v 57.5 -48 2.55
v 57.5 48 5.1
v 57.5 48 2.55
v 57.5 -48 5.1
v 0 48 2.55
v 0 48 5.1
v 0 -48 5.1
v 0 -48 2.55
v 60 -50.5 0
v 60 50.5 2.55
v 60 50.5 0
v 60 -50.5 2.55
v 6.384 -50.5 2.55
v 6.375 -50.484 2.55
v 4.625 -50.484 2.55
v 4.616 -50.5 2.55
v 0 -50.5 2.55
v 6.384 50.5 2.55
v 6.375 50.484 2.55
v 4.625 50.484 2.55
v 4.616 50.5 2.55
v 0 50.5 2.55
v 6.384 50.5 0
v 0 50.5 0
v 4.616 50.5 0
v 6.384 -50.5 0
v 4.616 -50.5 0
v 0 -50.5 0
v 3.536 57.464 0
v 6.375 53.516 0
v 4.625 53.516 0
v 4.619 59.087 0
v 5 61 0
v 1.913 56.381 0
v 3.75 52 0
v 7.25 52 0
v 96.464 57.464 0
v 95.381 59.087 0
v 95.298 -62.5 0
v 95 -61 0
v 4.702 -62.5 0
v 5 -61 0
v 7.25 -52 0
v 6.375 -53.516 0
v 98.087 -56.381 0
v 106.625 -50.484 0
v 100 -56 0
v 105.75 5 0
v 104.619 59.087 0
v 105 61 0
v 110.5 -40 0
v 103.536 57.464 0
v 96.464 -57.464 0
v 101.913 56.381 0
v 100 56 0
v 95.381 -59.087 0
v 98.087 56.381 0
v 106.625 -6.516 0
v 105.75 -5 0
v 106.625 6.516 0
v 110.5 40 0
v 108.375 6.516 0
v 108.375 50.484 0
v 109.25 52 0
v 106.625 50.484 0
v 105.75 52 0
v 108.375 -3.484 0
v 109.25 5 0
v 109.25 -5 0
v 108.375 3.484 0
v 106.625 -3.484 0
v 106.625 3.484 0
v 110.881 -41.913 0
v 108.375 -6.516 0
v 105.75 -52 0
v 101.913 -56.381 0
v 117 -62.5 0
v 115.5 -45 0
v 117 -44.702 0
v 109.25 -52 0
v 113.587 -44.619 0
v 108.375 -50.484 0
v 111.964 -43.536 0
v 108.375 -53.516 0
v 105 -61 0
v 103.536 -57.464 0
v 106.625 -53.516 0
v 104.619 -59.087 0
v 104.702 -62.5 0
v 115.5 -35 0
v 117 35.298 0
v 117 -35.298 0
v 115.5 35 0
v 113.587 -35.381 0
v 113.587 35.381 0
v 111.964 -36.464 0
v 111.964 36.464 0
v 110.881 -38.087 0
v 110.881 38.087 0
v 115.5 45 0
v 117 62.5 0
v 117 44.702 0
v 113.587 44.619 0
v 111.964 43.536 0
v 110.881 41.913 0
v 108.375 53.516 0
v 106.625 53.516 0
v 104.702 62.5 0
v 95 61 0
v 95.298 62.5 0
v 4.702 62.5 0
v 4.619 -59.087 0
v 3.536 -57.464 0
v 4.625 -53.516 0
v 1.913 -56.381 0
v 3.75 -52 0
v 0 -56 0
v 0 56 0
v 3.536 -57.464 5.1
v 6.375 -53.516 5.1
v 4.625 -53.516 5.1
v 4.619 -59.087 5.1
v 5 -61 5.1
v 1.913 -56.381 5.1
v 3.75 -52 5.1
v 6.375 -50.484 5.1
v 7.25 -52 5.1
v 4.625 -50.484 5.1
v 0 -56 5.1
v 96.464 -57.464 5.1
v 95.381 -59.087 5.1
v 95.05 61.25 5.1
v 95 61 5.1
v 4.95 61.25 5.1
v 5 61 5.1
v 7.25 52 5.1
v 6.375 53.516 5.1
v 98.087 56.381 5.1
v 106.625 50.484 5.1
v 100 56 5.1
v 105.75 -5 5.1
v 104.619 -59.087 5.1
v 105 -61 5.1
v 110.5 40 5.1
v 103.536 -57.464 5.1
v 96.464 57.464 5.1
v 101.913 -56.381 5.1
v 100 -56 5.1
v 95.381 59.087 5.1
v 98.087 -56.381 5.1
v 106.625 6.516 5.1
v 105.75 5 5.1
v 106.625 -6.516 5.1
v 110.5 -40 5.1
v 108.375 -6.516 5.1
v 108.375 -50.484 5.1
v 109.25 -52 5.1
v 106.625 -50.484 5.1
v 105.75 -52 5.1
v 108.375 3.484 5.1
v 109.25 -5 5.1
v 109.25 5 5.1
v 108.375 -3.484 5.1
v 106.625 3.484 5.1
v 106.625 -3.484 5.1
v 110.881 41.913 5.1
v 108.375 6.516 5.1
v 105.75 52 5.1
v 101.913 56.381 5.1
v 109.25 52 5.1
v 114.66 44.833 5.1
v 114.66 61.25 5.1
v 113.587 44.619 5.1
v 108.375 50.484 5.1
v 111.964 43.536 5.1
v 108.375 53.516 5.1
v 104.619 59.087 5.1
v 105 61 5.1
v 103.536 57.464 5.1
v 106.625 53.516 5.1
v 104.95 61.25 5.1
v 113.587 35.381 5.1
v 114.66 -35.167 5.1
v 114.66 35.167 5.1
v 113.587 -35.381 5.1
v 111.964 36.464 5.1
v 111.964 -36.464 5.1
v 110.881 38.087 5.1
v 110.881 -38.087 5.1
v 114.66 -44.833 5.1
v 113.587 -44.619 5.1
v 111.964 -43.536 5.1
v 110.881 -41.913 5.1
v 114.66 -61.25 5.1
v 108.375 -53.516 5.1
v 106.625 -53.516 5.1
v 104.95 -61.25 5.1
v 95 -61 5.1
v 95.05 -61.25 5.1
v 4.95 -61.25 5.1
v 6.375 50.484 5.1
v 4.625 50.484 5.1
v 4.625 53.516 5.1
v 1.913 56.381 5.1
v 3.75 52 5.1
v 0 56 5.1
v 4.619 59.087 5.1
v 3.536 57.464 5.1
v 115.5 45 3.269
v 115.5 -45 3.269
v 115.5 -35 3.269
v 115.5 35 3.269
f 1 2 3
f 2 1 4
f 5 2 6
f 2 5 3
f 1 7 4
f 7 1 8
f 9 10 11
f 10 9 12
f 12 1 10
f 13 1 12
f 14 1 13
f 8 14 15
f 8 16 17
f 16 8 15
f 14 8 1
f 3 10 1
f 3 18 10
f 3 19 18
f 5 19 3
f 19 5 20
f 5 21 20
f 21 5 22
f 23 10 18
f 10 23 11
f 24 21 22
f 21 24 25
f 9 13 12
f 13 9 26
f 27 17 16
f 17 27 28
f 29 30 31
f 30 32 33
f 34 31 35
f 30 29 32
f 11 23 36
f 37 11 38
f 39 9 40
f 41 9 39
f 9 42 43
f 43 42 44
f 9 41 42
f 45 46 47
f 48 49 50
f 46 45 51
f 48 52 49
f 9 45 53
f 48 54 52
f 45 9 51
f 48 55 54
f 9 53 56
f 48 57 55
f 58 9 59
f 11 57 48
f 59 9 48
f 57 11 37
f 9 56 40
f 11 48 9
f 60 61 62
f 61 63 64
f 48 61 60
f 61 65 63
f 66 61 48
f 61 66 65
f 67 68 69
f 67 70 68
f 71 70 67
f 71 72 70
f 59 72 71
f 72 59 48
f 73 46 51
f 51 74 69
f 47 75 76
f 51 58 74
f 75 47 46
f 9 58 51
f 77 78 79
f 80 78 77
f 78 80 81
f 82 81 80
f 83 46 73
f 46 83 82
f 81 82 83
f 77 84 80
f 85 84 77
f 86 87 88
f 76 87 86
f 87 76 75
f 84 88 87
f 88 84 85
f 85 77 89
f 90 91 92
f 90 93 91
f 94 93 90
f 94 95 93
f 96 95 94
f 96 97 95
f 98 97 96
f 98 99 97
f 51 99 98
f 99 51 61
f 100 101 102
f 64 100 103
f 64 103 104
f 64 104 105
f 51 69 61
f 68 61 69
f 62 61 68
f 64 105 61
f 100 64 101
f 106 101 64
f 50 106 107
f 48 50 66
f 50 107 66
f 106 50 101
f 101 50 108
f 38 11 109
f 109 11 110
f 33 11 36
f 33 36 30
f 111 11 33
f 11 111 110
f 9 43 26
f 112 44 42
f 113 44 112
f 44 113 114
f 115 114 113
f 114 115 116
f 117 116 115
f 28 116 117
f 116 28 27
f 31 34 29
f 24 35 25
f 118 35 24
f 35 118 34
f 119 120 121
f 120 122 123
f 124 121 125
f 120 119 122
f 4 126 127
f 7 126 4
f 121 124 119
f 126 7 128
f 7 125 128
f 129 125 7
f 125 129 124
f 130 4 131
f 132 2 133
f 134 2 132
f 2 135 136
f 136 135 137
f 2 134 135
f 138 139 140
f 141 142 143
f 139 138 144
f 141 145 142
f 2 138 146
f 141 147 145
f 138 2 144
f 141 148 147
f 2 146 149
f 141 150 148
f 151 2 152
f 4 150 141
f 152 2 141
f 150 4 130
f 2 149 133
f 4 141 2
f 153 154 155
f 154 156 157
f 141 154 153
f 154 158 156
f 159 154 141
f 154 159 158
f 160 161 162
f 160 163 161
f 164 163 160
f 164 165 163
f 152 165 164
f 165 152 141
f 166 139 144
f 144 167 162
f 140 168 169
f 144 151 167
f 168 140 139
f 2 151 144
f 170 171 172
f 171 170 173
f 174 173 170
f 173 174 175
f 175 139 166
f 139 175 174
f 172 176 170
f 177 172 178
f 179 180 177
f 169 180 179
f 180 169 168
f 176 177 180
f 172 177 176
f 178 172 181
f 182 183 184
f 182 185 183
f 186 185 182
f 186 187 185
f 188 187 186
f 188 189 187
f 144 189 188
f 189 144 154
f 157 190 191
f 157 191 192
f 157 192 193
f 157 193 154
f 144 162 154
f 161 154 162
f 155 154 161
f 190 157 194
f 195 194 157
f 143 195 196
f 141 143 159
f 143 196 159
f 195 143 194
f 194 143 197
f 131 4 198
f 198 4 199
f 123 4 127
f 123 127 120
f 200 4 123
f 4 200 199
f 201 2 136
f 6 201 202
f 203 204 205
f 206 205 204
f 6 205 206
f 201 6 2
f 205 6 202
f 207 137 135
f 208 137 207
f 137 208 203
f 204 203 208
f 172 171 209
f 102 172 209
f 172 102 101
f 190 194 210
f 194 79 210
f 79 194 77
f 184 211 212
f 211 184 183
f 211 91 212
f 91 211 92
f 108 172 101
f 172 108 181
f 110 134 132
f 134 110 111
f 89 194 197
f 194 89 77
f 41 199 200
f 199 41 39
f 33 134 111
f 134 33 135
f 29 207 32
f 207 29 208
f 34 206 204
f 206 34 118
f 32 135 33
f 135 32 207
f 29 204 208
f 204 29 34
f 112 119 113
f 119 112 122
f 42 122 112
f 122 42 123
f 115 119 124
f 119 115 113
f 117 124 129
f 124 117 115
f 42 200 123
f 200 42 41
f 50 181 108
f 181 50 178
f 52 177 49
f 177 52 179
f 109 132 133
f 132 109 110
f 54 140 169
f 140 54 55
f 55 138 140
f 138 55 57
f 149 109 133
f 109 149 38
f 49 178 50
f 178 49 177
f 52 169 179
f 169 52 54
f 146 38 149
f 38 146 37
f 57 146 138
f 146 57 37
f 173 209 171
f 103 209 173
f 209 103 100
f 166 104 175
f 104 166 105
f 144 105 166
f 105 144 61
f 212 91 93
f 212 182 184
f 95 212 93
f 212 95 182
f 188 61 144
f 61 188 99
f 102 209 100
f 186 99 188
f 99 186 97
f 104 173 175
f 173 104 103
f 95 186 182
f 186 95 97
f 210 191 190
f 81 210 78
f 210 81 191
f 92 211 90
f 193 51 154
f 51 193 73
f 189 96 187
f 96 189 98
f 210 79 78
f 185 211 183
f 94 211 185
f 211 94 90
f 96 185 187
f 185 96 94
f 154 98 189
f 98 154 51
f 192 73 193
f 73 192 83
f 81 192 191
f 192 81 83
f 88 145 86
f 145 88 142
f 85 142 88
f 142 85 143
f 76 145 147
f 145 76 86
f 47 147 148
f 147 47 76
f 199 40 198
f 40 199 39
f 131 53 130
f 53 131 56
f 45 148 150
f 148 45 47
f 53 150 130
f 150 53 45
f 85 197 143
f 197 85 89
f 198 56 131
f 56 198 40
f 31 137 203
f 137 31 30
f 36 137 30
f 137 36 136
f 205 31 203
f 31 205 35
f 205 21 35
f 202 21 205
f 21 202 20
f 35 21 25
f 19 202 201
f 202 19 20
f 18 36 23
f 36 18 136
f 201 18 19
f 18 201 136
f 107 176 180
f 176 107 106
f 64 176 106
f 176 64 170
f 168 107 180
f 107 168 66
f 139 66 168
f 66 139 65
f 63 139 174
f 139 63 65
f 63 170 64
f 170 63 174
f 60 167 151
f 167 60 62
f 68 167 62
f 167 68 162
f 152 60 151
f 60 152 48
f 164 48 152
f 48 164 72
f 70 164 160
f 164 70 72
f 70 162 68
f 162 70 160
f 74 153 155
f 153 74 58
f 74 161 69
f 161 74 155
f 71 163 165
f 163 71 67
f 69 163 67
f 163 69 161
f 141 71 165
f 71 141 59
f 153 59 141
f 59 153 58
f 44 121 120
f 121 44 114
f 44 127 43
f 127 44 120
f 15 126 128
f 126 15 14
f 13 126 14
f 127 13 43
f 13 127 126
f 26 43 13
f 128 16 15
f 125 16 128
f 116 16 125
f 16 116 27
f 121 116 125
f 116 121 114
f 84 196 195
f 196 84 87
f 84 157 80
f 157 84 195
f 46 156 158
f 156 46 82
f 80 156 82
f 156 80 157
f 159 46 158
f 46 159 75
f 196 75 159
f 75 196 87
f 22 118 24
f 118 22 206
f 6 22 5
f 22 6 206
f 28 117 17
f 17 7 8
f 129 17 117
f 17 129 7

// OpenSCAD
DISPLAY_height = 101; 
DISPLAY_width = 166; 
DISPLAY_depth = 5.1; 
DISPLAY_rim = 5;

FP_width = 234;
FP_height = 125;
thickness = 2;
clearance = 0.75;



 difference () {

    difference () {
    color("green")
        linear_extrude(height = DISPLAY_depth, scale = 0.98)
            square([FP_width, FP_height], center = true);
        
        translate([-23,0,0]){
            cube([DISPLAY_width - DISPLAY_rim, DISPLAY_height - DISPLAY_rim, DISPLAY_depth+10], center= true);
            cube([DISPLAY_width, DISPLAY_height, DISPLAY_depth], center= true);
        }
     
        
     // Front metal panel mount holes - not mounting of printed pannel  
     //=====================================   
        translate([0,61,0])  // center top screw
            cylinder(20, d=10, center=true);

        translate([-100,61,0]) // top left screw.
            cylinder(20, d=10, center=true);

        translate([-115.5,40,0]) // top left screw.
            cylinder(20, d=10, center=true);

        translate([-115.5,-40,0]) // top left screw.
            cylinder(20, d=10, center=true);

        translate([-100,-61,0]) // bottom left screw.
            cylinder(20, d=10, center=true);

        translate([0,-61,0])  // center bottom screw
            cylinder(20, d=10, center=true);

        translate([100,61,0]) // top right screw.
            cylinder(20, d=10, center=true);

        translate([115.5,40,0]) // top right screw.
            cylinder(20, d=10, center=true);

        translate([115.5,-40,0]) // top right screw.
            cylinder(20, d=10, center=true);

        translate([100,-61,0]) // bottom right screw.
            cylinder(20, d=10, center=true);
    //=======================================
    //Printed panel mount holes.
    ///////////////////////////////////////////////////////////

        translate([5.5, 52, 0])  // center top screw
            cylinder(20, d=3.5, center=true);

        translate([-107.5, 52, 0]) // top left screw.
            cylinder(20, d=3.5, center=true);

        translate([-5.5, 52 ,0]) // top left screw.
            cylinder(20, d=3.5, center=true);

        translate([107.5, 52,0]) // top left screw.
            cylinder(20, d=3.5, center=true);
            
            
            

        translate([-107.5,5,0]) // center left screw.
            cylinder(20, d=3.5, center=true);

        translate([-107.5,-5,0])  // center left screw
            cylinder(20, d=3.5, center=true);

        translate([107.5,5,0]) // top right screw.
            cylinder(20, d=3.5, center=true);

        translate([107.5,-5,0]) // top right screw.
            cylinder(20, d=3.5, center=true);
            
            

        translate([-107.5, -52,0]) // top right screw.
            cylinder(20, d=3.5, center=true);
        translate([-5.5, -52,0]) // bottom right screw.
            cylinder(20, d=3.5, center=true);
        translate([5.5, -52,0]) // bottom right screw.
            cylinder(20, d=3.5, center=true);
        translate([107.5, -52,0]) // top right screw.
            cylinder(20, d=3.5, center=true);
    }
//    translate([100, 0, 0]) // top right screw.     // crop left or right half of the panel to fit it in printer
    translate([-100, 0, 0]) // top right screw.     // crop left or right half of the panel to fit it in printer
        cube(200, 200,  20, center=true);    
}
